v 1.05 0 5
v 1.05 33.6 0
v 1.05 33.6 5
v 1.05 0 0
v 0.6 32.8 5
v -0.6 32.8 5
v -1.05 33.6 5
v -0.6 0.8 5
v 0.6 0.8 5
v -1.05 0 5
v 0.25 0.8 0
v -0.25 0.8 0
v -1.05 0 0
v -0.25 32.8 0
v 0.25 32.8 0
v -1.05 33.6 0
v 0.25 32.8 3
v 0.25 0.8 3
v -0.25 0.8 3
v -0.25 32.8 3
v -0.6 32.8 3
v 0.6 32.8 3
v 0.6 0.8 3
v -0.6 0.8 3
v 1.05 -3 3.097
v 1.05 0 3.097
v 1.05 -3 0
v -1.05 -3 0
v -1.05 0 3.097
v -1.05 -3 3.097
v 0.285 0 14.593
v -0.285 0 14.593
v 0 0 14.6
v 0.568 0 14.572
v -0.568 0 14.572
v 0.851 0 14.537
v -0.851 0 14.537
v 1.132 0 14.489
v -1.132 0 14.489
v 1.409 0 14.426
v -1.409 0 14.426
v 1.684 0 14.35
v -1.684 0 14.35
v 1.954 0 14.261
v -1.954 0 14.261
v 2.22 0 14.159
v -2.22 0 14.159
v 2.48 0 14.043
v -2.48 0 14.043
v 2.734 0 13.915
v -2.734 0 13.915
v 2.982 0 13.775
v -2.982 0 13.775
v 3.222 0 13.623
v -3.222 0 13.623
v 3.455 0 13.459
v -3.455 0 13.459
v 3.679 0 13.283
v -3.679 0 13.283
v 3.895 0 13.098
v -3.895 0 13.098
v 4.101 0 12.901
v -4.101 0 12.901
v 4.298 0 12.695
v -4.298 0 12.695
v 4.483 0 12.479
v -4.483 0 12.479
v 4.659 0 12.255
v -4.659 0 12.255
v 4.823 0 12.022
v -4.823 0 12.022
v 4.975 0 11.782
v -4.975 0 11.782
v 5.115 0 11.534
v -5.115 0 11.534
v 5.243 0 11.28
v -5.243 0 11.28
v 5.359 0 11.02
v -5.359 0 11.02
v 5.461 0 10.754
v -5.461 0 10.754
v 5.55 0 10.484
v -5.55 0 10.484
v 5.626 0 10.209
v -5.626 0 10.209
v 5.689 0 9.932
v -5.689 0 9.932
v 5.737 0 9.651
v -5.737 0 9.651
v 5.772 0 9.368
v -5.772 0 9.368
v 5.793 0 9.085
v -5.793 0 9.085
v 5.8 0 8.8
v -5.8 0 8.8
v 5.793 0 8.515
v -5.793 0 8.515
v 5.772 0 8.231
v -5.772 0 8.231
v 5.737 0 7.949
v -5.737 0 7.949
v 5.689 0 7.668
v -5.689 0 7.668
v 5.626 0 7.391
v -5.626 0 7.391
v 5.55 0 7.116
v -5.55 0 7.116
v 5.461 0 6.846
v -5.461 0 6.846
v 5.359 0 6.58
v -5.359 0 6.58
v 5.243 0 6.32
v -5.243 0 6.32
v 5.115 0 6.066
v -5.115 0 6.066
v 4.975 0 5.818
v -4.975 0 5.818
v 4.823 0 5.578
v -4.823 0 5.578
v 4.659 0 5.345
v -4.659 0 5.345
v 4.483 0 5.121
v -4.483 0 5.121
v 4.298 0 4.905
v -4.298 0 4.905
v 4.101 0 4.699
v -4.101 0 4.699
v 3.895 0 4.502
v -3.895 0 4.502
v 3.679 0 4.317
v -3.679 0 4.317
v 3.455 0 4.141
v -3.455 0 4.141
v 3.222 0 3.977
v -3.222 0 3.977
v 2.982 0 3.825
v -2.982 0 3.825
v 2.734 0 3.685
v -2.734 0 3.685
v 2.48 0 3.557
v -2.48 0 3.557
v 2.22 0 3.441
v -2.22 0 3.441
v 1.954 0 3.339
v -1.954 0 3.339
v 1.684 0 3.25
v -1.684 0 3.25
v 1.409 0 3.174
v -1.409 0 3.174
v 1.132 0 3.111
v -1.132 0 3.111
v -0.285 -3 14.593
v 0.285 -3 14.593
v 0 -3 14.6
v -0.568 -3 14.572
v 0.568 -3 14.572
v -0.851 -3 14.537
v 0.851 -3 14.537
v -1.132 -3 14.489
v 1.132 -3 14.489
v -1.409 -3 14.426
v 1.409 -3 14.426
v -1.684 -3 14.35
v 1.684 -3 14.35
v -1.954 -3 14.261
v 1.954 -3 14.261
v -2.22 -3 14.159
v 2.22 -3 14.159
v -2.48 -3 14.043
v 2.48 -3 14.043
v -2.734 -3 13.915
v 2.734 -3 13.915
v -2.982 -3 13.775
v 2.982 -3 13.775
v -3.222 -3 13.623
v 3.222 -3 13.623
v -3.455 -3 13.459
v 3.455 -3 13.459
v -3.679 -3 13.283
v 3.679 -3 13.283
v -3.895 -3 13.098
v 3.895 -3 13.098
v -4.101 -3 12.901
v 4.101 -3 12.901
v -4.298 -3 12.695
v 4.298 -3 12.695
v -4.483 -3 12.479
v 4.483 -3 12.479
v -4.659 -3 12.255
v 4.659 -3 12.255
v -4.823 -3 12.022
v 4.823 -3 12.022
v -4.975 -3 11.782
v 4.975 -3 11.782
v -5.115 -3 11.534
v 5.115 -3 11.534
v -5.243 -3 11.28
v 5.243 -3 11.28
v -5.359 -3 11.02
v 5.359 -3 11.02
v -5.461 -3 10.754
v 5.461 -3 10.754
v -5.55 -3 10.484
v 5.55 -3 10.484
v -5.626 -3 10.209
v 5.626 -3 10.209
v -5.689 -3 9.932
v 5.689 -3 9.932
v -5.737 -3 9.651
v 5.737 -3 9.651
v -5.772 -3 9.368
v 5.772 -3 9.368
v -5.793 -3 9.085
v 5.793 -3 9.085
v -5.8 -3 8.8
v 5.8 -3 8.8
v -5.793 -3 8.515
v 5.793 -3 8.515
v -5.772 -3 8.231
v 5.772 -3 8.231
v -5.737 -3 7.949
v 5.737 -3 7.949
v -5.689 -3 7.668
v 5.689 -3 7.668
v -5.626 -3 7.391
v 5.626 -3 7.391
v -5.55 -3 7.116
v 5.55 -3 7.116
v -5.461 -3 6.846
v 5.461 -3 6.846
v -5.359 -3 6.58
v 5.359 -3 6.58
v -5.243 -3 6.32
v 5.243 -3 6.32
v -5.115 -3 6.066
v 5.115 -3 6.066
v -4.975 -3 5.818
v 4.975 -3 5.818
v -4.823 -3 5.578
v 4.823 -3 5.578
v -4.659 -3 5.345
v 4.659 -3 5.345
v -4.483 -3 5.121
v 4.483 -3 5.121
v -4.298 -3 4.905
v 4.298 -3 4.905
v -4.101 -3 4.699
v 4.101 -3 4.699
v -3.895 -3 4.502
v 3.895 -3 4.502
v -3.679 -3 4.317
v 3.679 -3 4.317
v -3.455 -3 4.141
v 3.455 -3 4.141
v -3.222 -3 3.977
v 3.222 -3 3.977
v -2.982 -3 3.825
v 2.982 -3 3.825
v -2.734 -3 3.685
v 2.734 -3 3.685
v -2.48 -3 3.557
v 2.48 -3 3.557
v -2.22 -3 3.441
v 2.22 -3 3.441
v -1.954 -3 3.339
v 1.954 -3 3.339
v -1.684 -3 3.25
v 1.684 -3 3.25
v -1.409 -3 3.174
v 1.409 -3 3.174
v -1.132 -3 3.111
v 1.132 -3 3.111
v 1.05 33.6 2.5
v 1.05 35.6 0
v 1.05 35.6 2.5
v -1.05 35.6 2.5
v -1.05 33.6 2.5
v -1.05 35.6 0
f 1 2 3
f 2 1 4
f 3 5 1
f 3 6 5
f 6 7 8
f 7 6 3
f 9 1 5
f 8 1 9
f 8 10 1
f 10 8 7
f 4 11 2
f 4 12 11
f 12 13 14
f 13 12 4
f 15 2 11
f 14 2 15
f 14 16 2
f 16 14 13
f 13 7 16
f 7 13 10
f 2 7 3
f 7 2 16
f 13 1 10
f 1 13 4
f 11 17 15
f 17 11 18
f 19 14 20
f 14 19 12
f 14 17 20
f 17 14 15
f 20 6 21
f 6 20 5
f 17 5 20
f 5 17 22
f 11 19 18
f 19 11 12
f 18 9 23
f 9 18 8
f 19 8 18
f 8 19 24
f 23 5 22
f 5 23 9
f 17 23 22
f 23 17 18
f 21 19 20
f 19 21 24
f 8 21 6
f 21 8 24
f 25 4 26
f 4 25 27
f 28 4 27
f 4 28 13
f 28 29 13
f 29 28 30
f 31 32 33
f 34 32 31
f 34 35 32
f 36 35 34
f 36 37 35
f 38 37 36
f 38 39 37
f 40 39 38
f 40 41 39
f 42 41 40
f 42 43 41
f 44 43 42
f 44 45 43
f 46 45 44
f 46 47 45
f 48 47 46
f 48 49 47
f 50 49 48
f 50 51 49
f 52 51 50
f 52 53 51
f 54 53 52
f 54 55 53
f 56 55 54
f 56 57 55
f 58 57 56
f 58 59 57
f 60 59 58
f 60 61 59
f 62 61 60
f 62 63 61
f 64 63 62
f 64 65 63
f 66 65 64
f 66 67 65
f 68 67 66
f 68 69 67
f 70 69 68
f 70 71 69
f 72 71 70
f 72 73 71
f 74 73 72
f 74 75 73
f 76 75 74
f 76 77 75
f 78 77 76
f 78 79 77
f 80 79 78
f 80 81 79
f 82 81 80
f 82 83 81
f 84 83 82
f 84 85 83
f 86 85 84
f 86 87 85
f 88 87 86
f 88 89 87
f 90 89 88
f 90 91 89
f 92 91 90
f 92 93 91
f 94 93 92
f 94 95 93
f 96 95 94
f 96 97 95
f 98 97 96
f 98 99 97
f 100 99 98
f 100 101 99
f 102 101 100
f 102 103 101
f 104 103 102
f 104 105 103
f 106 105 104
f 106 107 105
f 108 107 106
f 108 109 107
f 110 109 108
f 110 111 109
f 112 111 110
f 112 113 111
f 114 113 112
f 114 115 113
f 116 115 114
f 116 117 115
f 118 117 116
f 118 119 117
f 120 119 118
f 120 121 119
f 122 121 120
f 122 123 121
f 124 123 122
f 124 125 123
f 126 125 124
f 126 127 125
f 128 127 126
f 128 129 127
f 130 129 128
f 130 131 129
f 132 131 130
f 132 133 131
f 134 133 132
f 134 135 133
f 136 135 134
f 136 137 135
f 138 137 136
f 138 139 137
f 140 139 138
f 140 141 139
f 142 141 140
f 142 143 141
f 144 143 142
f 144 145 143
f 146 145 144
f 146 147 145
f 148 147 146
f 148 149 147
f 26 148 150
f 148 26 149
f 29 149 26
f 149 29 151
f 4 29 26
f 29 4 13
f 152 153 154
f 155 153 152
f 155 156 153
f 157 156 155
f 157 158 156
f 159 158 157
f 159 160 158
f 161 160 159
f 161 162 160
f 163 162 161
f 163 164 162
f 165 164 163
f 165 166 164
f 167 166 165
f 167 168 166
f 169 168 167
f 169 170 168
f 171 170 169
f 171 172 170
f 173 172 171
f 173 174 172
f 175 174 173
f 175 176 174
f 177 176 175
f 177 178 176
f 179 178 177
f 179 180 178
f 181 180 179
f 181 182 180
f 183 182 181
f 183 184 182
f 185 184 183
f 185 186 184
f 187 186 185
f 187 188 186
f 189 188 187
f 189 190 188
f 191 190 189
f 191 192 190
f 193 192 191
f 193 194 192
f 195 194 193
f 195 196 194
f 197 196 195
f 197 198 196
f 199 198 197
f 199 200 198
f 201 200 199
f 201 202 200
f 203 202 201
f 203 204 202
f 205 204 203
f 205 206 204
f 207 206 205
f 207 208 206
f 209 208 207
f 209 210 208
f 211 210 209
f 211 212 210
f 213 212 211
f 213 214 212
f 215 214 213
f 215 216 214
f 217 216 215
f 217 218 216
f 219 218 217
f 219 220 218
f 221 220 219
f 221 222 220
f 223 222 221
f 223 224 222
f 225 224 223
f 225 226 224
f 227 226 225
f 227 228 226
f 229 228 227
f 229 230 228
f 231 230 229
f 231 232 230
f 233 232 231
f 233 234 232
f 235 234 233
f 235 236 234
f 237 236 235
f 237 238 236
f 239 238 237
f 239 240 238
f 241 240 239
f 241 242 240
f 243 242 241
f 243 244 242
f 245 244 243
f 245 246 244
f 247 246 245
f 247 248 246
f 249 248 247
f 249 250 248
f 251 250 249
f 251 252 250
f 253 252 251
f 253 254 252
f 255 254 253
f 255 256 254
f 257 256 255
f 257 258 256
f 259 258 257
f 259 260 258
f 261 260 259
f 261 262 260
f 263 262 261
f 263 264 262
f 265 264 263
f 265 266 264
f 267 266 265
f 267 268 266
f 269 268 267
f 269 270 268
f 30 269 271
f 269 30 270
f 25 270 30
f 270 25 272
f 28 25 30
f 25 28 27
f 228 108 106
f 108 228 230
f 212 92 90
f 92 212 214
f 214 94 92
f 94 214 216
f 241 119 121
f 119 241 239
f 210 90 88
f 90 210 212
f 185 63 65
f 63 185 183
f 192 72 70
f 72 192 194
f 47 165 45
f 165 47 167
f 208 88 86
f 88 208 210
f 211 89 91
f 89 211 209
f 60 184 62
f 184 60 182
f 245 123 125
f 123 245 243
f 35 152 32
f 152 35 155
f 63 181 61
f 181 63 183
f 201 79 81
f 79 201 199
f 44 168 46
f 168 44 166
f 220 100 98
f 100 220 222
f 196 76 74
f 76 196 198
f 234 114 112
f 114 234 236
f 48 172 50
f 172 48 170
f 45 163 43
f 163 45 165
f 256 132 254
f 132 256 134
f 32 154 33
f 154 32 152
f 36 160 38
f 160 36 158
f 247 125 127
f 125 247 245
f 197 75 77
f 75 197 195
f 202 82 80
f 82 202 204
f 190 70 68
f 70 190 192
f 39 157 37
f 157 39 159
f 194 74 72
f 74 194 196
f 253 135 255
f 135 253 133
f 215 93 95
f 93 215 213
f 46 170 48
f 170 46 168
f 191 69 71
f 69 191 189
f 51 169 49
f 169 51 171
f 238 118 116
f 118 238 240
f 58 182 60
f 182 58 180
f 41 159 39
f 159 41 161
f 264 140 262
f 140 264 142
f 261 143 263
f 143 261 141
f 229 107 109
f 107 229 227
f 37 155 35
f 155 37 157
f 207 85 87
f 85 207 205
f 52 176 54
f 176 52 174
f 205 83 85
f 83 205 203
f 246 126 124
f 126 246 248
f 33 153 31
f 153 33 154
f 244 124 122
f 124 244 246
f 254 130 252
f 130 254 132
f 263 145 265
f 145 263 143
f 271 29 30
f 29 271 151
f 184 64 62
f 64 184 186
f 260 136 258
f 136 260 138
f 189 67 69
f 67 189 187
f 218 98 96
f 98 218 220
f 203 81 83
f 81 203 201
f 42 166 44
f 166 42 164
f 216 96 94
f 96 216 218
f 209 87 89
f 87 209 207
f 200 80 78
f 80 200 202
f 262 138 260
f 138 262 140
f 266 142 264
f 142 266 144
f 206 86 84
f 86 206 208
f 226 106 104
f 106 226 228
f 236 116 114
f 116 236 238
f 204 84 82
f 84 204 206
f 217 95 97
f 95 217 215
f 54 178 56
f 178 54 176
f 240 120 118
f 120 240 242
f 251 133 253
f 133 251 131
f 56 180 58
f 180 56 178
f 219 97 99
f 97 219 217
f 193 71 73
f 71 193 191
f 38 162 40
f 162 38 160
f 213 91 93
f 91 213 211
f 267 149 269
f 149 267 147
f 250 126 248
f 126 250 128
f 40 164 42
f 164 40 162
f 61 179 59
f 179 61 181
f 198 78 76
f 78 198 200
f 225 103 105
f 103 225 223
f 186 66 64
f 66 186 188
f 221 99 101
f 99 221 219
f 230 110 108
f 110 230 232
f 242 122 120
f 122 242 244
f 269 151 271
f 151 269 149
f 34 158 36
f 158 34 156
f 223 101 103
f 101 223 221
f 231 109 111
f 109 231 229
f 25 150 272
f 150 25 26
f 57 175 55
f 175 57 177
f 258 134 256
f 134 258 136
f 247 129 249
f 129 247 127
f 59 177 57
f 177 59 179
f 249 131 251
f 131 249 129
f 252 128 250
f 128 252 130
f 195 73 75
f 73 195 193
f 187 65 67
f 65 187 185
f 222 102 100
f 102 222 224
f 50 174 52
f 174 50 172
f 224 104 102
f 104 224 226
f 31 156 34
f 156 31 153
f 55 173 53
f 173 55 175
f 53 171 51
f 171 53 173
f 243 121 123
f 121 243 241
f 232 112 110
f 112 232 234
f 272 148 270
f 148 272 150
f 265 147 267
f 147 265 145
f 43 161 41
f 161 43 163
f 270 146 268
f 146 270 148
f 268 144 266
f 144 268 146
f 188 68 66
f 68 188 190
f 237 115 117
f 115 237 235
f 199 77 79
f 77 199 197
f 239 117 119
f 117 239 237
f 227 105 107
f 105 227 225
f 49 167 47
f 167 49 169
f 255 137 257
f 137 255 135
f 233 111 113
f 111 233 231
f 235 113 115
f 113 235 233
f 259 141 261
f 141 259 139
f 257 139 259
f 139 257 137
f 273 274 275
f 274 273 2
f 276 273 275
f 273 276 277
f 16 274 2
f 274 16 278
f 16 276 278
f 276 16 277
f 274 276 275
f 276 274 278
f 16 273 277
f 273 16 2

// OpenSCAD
// file: consts.scad
STRIPE_X = 3.4; //width of the LED stripe pcb
STRIPE_Y = 48.5; //length of LED stripe pcb
STRIPE_Z = 0.6; //pcb thickness of LED stripe pcb
LED_X=2; //edge length of LED (assumed to be square)
LED_Z = 1; //LED height above PCB

FIL_D = 0.25; //fiber diameter
NOZ_D = 0.4; //nozzle diameter
CLIP_Z = 5; //height of clip
N = 64; //number of fibers

D_I = 11.6; //inner diameter of pen
D_O = D_I+4*NOZ_D; //outer diameter of pen

CLIP_X = 2*FIL_D+4*NOZ_D;
CLIP_L = 2*N*FIL_D+4*NOZ_D;

CAP_H = 3; //height of cap cylinder attached to clip

PEN_UPPER_Z = 60; //height of upper pen part 
PEN_LOWER_BODY_Z = 60; //height of the cylindrical part
PEN_LOWER_TIP_Z = 20; //height of the tip cone

FIBER_CLAMP_Z = 2;
FIBER_CLAMP_X = 1.2;

STRIPE_JOINER_Z = 3; //height of the 4stripe joiner
// main file
$fn=128;

include <consts.scad>;

//This realized the clip+top of the pen
//
//Print with regular PLA


translate([0, CLIP_L/2, CLIP_Z/2])difference() {
    cube([CLIP_X, CLIP_L, CLIP_Z], center=true);
    cube([2*FIL_D, 2*N*FIL_D, CLIP_Z+2], center=true);
    #translate([0,0,(CLIP_Z-FIBER_CLAMP_Z)/2])cube([FIBER_CLAMP_X, 2*N*FIL_D, FIBER_CLAMP_Z], center=true);
}


CAP_D = D_I;
CLIP_OFFSET_Z = 3;
translate([0, -CAP_H/2, CLIP_Z/2])cube([CLIP_X, CAP_H, CLIP_Z], center=true);
translate([0,0,CAP_D/2+CLIP_OFFSET_Z])rotate([90,0,0])cylinder(h=CAP_H, d=CAP_D);


translate([0,CLIP_L+2/2, CLIP_Z/2/2])cube([CLIP_X, 2, CLIP_Z/2], center=true);
